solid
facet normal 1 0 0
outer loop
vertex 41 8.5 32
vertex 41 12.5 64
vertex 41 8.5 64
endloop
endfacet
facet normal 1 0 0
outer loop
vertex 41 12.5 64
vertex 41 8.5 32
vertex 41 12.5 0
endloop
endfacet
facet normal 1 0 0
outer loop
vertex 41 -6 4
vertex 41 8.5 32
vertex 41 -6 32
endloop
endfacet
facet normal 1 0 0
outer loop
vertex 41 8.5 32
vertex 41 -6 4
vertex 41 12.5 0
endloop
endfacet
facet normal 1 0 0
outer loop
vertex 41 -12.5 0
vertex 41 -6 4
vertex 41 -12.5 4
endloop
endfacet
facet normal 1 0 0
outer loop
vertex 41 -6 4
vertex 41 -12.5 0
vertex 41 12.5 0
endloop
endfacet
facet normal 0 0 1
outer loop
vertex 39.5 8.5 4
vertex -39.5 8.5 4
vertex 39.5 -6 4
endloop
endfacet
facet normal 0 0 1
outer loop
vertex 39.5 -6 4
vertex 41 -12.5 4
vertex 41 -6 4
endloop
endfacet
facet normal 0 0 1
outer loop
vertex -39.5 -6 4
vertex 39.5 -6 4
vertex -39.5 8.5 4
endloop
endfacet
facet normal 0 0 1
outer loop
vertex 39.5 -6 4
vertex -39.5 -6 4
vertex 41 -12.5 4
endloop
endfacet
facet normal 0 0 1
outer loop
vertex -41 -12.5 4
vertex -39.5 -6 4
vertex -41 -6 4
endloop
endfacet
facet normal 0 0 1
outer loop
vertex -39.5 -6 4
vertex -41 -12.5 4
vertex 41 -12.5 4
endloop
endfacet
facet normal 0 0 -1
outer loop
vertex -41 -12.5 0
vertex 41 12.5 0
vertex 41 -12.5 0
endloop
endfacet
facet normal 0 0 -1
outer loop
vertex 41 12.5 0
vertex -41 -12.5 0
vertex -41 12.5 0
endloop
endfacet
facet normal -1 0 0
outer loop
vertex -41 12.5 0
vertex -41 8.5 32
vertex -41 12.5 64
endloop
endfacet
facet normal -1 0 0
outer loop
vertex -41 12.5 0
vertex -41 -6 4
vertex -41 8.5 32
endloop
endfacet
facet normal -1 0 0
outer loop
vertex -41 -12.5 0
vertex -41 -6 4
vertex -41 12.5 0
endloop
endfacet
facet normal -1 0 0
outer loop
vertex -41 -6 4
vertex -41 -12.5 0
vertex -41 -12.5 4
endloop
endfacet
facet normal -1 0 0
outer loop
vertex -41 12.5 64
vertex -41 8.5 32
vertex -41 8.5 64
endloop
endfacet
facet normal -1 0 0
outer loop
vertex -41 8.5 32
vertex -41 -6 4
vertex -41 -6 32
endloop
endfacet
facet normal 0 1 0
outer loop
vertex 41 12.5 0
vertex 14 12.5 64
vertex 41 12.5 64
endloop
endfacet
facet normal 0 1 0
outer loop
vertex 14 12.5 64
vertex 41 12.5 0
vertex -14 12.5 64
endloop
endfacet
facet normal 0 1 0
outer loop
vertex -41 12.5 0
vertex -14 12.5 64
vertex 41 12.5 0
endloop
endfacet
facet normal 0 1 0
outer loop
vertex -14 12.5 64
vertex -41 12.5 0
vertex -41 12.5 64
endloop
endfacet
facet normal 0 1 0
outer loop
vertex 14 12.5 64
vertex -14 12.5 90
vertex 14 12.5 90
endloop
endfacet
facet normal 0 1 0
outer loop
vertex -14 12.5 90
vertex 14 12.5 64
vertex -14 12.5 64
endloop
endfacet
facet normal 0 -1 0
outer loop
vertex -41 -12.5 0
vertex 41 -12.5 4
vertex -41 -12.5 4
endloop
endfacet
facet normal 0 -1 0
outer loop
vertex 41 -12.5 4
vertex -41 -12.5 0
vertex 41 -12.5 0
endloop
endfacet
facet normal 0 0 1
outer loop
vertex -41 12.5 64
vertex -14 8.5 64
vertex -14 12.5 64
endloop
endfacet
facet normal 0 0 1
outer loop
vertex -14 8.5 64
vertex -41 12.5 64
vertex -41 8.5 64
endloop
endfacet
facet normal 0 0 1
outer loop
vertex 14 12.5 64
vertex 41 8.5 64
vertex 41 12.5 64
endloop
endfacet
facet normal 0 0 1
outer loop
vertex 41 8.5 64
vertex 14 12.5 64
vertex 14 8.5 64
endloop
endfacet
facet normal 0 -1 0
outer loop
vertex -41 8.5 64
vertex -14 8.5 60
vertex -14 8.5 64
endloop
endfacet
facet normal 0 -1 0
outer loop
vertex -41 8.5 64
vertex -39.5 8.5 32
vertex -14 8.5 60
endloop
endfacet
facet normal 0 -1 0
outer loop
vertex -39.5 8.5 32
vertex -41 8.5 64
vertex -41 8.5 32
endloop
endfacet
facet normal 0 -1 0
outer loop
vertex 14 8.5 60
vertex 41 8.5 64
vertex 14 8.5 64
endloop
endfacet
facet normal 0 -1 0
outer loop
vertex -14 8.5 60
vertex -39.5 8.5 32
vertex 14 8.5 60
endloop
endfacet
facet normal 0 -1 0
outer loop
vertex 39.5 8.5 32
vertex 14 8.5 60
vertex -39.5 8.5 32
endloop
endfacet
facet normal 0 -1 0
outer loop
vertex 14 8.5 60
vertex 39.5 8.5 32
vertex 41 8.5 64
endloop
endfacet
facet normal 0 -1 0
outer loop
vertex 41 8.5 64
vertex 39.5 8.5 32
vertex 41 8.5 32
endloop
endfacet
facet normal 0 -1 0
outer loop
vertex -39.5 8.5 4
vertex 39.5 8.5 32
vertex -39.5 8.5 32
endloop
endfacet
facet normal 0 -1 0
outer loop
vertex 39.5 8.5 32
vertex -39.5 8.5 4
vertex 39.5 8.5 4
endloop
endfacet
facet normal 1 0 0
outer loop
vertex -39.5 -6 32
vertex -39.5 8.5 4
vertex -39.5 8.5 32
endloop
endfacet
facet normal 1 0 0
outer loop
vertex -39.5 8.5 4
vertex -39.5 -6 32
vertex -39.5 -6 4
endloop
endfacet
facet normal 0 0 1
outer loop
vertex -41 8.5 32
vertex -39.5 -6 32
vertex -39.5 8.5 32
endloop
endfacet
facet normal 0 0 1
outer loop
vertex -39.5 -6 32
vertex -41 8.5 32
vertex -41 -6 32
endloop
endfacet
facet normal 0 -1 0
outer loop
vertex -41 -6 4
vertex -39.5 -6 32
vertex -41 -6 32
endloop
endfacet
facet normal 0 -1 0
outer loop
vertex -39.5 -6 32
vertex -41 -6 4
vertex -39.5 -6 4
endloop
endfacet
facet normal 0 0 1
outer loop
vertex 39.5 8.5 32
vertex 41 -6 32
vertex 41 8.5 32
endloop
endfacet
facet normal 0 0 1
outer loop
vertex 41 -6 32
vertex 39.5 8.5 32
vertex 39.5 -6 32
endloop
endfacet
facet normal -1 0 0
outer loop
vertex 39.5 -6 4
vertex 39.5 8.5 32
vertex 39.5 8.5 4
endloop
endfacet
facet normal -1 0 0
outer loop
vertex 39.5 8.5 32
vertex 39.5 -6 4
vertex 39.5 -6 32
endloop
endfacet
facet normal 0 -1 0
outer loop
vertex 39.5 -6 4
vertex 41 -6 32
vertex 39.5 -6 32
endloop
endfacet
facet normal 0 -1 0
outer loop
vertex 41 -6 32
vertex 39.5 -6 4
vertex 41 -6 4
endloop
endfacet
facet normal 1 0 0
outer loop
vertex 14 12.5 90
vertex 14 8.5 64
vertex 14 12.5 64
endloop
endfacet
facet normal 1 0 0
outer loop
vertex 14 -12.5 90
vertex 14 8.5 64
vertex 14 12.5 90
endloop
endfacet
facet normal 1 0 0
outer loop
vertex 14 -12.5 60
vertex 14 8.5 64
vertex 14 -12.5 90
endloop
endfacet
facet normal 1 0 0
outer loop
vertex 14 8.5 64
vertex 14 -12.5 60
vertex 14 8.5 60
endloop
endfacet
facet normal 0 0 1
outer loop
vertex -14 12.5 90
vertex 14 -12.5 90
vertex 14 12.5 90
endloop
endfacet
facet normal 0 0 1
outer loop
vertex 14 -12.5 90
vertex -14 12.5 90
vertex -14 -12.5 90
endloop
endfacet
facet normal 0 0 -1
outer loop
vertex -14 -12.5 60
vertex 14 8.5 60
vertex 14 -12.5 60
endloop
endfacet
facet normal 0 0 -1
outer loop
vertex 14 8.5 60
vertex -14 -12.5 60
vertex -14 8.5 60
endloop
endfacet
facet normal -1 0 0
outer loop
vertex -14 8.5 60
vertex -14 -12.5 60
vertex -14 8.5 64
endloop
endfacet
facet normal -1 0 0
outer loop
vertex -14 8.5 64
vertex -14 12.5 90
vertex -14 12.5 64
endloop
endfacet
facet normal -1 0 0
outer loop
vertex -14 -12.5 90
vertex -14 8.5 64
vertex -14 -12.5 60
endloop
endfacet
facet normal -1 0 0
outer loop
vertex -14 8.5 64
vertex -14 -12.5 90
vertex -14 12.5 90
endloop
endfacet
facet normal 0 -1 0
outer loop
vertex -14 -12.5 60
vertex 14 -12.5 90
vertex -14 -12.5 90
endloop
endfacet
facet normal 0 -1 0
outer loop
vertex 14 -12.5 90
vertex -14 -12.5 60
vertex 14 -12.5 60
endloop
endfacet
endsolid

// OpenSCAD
// Millimetres. Choose product, left, right, tray, or rest in the Customizer.
part = "left";

module box(x0, x1, y0, y1, z0, z1) {
    translate([x0, y0, z0]) cube([x1-x0, y1-y0, z1-z0]);
}

module protector(side) {
    scale([1, side, 1]) union() {
        box(-41, 41, -12.5, 12.5, 0, 4);
        box(-41, 41, 8.5, 12.5, 4, 64);
        box(-41, -39.5, -6, 8.5, 4, 32);
        box(39.5, 41, -6, 8.5, 4, 32);
        box(-14, 14, -12.5, 12.5, 60, 90);
    }
}

module tray() {
    box(-47, 47, -85, 85, 0, 4);
    box(-47, -43, -85, 85, 4, 26);
    box(43, 47, -85, 85, 4, 26);
    box(-43, 43, -85, -81, 4, 26);
    box(-43, 43, 81, 85, 4, 26);
}

if (part == "product") box(-35, 35, -75, 75, 0, 40);
if (part == "left") protector(1);
if (part == "right") protector(-1);
if (part == "tray") tray();
if (part == "rest") box(-29, 29, -46, 46, 0, 15);
